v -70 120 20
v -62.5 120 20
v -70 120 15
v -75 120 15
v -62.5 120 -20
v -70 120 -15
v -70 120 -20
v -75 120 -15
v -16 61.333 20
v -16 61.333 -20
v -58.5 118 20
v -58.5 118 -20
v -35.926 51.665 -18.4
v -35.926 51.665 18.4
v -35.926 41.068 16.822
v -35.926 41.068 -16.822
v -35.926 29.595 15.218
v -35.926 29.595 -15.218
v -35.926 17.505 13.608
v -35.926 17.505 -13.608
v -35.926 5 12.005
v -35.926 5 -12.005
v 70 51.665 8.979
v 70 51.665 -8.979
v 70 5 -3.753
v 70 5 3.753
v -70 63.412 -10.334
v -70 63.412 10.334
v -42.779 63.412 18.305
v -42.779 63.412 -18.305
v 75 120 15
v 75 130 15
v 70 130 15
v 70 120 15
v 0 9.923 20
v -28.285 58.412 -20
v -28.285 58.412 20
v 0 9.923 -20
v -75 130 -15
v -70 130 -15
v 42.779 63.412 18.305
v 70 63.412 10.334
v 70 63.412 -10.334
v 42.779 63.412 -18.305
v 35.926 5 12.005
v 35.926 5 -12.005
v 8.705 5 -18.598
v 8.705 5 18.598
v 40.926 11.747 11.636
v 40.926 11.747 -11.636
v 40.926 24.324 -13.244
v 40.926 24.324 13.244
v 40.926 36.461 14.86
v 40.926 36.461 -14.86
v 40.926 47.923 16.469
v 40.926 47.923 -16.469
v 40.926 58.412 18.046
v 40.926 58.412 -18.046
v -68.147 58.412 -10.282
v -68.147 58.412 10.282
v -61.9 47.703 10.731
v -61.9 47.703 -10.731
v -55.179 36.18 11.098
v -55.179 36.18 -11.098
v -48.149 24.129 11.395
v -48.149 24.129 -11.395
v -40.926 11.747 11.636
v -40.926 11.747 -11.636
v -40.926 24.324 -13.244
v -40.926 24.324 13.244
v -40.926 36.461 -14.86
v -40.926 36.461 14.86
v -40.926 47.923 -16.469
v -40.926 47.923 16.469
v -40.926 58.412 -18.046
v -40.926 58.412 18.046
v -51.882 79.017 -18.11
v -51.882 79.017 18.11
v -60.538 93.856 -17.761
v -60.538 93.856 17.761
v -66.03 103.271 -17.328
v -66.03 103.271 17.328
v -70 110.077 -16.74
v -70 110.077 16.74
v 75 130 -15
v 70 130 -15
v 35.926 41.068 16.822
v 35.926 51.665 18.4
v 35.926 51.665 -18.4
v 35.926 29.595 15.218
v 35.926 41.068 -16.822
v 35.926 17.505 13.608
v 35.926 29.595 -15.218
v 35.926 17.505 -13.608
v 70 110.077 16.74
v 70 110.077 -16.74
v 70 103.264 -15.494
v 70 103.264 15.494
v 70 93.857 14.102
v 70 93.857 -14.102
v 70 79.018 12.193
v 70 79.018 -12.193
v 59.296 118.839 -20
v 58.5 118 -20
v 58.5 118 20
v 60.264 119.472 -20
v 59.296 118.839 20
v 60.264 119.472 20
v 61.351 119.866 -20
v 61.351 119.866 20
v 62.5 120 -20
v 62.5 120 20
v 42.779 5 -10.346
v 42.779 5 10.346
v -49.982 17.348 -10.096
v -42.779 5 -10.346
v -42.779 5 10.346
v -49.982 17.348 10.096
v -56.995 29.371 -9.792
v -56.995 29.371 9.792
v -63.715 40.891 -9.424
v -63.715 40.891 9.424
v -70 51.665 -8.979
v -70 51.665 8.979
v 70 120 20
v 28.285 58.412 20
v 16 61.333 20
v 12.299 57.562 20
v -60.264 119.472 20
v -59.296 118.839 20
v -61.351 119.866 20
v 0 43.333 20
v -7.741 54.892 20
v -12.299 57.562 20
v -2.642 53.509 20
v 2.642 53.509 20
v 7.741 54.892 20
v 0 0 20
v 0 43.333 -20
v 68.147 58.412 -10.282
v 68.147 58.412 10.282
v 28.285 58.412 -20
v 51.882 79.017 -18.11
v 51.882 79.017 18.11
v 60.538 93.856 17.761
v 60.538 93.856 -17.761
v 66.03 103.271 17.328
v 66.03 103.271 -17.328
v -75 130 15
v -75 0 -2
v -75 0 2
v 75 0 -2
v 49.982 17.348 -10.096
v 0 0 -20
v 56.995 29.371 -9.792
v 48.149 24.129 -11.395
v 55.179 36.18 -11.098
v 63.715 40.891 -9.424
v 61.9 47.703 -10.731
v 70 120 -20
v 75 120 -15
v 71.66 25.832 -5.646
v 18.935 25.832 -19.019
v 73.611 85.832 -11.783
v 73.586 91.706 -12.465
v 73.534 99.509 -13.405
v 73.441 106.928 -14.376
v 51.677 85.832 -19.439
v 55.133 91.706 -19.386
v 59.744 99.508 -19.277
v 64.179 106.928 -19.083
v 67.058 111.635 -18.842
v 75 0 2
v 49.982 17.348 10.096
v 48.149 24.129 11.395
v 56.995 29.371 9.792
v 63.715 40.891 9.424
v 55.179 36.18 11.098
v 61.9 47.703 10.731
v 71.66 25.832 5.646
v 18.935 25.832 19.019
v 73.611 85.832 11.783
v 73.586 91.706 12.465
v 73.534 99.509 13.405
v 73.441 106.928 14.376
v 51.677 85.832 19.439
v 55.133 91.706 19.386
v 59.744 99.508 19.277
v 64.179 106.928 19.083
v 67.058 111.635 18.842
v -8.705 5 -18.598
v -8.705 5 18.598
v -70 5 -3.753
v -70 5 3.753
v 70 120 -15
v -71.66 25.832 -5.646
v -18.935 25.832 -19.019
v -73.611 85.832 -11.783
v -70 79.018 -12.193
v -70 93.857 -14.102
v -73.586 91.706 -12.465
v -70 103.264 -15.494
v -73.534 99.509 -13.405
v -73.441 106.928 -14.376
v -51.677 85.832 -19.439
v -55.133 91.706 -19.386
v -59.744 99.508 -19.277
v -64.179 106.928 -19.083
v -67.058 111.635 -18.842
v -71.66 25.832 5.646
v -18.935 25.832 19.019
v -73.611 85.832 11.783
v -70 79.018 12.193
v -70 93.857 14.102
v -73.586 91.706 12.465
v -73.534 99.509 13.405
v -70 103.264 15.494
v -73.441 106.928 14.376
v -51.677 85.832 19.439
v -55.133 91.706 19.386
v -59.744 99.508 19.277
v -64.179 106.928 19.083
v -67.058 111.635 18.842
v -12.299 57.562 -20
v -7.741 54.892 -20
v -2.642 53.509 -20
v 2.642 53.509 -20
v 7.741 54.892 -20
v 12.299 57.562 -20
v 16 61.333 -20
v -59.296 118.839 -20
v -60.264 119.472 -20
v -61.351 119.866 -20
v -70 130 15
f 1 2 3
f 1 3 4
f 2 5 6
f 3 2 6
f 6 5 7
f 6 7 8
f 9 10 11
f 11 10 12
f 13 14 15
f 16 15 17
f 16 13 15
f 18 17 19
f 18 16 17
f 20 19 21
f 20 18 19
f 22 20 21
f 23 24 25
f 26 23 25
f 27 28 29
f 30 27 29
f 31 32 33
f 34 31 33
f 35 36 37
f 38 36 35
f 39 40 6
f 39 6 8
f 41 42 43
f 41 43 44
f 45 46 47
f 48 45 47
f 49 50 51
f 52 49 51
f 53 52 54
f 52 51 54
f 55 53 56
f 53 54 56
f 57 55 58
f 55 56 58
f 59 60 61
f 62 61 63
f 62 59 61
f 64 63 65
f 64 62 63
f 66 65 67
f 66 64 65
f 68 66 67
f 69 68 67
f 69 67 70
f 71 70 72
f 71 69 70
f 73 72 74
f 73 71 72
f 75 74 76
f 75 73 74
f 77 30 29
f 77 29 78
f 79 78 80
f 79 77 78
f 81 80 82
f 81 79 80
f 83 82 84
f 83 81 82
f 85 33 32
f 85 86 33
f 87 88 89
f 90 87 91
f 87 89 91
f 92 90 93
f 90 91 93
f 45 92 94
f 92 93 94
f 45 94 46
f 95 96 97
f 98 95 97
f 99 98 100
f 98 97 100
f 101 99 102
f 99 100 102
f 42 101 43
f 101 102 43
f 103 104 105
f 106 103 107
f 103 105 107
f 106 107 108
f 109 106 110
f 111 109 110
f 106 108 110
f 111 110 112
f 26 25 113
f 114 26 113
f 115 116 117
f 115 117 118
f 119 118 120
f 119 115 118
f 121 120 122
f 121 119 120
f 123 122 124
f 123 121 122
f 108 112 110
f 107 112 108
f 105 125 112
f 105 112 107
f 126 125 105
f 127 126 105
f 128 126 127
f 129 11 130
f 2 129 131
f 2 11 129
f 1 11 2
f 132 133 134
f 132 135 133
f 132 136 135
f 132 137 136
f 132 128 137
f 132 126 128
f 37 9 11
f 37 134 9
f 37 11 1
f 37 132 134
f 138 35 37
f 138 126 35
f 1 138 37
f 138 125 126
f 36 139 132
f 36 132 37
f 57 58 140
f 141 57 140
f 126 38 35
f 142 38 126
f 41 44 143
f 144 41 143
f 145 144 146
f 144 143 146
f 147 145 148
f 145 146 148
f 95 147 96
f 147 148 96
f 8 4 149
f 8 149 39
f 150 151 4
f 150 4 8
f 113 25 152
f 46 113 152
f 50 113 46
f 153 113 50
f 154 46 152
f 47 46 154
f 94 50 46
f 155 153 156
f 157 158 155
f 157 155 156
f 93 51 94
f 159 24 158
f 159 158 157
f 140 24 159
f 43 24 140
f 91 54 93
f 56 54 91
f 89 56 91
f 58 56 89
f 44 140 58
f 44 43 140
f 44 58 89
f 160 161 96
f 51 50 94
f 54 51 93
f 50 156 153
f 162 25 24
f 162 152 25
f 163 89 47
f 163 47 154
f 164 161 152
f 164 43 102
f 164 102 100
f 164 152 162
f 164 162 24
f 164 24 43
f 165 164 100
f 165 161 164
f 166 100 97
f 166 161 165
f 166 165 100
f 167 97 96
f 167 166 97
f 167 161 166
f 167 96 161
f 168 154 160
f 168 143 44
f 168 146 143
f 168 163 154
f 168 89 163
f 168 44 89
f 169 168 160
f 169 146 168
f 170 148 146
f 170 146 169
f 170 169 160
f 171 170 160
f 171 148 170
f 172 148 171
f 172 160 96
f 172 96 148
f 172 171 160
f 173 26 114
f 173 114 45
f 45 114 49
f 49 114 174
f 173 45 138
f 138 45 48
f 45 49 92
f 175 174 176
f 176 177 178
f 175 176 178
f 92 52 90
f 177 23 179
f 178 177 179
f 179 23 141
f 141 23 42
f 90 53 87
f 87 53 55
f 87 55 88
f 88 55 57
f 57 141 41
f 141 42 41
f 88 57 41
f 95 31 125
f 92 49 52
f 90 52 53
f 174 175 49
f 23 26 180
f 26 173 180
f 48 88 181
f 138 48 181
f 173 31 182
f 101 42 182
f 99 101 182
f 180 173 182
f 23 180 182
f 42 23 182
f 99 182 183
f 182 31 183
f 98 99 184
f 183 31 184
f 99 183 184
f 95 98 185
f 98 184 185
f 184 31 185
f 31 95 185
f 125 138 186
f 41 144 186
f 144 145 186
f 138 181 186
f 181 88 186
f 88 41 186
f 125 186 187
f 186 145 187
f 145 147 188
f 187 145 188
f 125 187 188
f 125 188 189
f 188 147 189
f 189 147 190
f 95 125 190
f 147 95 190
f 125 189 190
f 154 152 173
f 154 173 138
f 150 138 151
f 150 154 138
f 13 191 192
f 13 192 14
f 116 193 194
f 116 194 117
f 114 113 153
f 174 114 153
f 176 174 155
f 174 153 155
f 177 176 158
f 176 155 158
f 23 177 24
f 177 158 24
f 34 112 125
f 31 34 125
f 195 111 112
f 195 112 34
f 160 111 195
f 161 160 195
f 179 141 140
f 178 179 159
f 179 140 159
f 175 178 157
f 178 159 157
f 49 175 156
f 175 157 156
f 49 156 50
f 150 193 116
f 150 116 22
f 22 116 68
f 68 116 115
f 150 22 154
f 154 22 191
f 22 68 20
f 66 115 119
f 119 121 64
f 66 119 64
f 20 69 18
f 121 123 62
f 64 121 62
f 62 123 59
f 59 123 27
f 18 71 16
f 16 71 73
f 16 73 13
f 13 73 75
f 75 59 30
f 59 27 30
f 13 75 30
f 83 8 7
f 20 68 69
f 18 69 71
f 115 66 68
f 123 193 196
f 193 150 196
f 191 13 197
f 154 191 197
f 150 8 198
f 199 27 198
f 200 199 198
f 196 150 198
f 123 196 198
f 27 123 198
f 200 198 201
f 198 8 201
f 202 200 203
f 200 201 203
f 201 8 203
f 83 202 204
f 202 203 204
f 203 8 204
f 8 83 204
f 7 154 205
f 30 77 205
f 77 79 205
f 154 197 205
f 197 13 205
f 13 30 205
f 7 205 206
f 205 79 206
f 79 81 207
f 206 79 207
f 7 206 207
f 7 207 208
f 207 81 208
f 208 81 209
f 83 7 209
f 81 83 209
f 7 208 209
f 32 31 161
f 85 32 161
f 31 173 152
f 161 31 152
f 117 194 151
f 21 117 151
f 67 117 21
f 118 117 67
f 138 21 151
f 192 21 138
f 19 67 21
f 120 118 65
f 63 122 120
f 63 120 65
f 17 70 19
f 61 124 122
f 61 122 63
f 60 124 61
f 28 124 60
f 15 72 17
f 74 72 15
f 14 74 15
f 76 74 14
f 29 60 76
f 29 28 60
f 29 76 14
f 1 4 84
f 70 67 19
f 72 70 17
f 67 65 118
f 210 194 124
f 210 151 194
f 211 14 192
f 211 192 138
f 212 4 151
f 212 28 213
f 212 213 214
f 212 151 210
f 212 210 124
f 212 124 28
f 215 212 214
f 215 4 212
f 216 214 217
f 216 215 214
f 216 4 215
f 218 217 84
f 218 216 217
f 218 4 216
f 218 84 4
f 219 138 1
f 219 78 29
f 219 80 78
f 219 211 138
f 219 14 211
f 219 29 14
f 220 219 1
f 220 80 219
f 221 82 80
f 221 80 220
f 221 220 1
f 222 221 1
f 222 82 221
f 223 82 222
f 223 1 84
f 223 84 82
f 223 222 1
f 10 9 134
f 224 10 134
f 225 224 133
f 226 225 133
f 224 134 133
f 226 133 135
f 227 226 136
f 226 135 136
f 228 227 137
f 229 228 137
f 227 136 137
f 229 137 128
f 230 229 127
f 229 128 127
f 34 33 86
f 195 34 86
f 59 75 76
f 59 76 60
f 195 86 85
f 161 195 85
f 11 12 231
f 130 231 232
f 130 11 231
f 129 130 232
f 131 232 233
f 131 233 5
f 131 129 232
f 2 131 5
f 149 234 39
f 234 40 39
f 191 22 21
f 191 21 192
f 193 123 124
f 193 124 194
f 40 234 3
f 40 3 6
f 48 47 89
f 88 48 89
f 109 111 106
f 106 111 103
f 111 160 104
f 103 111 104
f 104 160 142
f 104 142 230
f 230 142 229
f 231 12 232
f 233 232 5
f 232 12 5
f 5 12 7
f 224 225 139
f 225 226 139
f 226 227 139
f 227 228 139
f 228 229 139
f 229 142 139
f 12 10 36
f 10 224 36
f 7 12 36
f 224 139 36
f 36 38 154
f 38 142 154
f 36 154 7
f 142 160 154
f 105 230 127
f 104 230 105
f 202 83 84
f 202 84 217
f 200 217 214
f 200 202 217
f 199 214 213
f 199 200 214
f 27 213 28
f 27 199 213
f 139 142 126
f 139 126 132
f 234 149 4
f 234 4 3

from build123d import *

# Parameters (mm, degrees)
SKETCH6_W               = 150
SKETCH6_H               = 40
BOSS_EXTRUDE1_DEPTH     = 130
CUT_EXTRUDE1_DEPTH      = 10
CUT_EXTRUDE2_DEPTH      = 152.410039297
CUT_EXTRUDE2_DEPTH_BACK = 152.410039297
FILLET1_R               = 20
FILLET2_R               = 5
CUT_EXTRUDE3_DEPTH      = 152.410039446
CUT_EXTRUDE3_DEPTH_BACK = 152.410039446


# Read off the part's stored shape, not the designer's step: Mirror2
with BuildPart() as part:
    # Sketch6 → Boss-Extrude1 (new body)
    with BuildSketch(Plane(origin=(0, 0, 0), x_dir=(1, 0, 0), z_dir=(0, 1, 0))):
        Rectangle(SKETCH6_W, SKETCH6_H)
    extrude(amount=BOSS_EXTRUDE1_DEPTH)

    # Sketch7 → Cut-Extrude1 (cut)
    with BuildSketch(Plane(origin=(0, 130, 0), x_dir=(1, 0, 0), z_dir=(0, 1, 0))):
        Polygon((-75, 20), (-75, 15), (-70, 15), (-70, -15), (-75, -15), (-75, -20), (75, -20), (75, -15), (70, -15), (70, 15), (75, 15), (75, 20), align=None)
    extrude(amount=-CUT_EXTRUDE1_DEPTH, mode=Mode.SUBTRACT)

    # Sketch8 → Cut-Extrude2 (cut, two sides: drawn at the far end of the back side and taken through both)
    with BuildSketch(Plane.XY.offset(-CUT_EXTRUDE2_DEPTH_BACK)):
        Polygon((-60, 120), (0, 40), (60, 120), align=None)
    extrude(amount=CUT_EXTRUDE2_DEPTH + CUT_EXTRUDE2_DEPTH_BACK, mode=Mode.SUBTRACT)

    # Fillet1
    fillet1_edges = [part.edges().sort_by_distance(p)[0] for p in [
        (0, 40, 0),
    ]]
    fillet(fillet1_edges, radius=FILLET1_R)

    # Fillet2
    fillet2_edges = [part.edges().sort_by_distance(p)[0] for p in [
        (-60, 120, 0),
        (60, 120, 0),
    ]]
    fillet(fillet2_edges, radius=FILLET2_R)

    # Sketch10 → Cut-Loft1 section 0
    with BuildSketch(Plane.XZ):
        with BuildLine():
            Line((75, 20), (75, 2))
            Line((75, 2), (0, 20))
            Line((0, 20), (75, 20))
        make_face()
    # Sketch9 → Cut-Loft1 section 1
    with BuildSketch(Plane(origin=(0, 120, 0), x_dir=(1, 0, 0), z_dir=(0, 1, 0))):
        with BuildLine():
            Line((75, -15), (75, -20))
            Line((75, -20), (70, -20))
            Line((70, -20), (75, -15))
        make_face()
    cut_loft1 = loft(mode=Mode.SUBTRACT)

    # Mirror1: Cut-Loft1 across plane
    add(cut_loft1.mirror(Plane.XY), mode=Mode.SUBTRACT)

    # Mirror2
    split(bisect_by=Plane(origin=(0, 0, 0), x_dir=(0, 0, 1), z_dir=(1, 0, 0)), keep=Keep.TOP)

    # Mirror2 2: part across plane


with BuildPart() as part_1:
    add(part.part)
    add(part.part.mirror(Plane(origin=(0, 0, 0), x_dir=(0, 0, 1), z_dir=(1, 0, 0))))

    # Sketch12 → Cut-Extrude3 (cut, two sides: drawn at the far end of the back side and taken through both)
    with BuildSketch(Plane.XY.offset(-CUT_EXTRUDE3_DEPTH_BACK)):
        Polygon((-70, 110.076825722), (-70, 63.412063573), (-42.778888747, 63.412063573), align=None)
        Polygon((-70, 51.664762149), (-70, 5), (-42.778888747, 5), align=None)
        Polygon((-68.147407502, 58.412063573), (-40.926296249, 11.747301425), (-40.926296249, 58.412063573), align=None)
        Polygon((-35.926296249, 51.664762149), (-35.926296249, 5), (-8.705184996, 5), align=None)
        Polygon((0, 43.333333333), (-28.285185422, 58.412063573), (0, 9.923174278), (28.285185422, 58.412063573), align=None)
        Polygon((40.926296249, 11.747301425), (40.926296249, 58.412063573), (68.147407502, 58.412063573), align=None)
        Polygon((8.705184996, 5), (35.926296249, 51.664762149), (35.926296249, 5), align=None)
        Polygon((70, 5), (42.778888747, 5), (70, 51.664762149), align=None)
        Polygon((70, 63.412063573), (42.778888747, 63.412063573), (70, 110.076825722), align=None)
    extrude(amount=CUT_EXTRUDE3_DEPTH + CUT_EXTRUDE3_DEPTH_BACK, mode=Mode.SUBTRACT)


solid = part_1.part
